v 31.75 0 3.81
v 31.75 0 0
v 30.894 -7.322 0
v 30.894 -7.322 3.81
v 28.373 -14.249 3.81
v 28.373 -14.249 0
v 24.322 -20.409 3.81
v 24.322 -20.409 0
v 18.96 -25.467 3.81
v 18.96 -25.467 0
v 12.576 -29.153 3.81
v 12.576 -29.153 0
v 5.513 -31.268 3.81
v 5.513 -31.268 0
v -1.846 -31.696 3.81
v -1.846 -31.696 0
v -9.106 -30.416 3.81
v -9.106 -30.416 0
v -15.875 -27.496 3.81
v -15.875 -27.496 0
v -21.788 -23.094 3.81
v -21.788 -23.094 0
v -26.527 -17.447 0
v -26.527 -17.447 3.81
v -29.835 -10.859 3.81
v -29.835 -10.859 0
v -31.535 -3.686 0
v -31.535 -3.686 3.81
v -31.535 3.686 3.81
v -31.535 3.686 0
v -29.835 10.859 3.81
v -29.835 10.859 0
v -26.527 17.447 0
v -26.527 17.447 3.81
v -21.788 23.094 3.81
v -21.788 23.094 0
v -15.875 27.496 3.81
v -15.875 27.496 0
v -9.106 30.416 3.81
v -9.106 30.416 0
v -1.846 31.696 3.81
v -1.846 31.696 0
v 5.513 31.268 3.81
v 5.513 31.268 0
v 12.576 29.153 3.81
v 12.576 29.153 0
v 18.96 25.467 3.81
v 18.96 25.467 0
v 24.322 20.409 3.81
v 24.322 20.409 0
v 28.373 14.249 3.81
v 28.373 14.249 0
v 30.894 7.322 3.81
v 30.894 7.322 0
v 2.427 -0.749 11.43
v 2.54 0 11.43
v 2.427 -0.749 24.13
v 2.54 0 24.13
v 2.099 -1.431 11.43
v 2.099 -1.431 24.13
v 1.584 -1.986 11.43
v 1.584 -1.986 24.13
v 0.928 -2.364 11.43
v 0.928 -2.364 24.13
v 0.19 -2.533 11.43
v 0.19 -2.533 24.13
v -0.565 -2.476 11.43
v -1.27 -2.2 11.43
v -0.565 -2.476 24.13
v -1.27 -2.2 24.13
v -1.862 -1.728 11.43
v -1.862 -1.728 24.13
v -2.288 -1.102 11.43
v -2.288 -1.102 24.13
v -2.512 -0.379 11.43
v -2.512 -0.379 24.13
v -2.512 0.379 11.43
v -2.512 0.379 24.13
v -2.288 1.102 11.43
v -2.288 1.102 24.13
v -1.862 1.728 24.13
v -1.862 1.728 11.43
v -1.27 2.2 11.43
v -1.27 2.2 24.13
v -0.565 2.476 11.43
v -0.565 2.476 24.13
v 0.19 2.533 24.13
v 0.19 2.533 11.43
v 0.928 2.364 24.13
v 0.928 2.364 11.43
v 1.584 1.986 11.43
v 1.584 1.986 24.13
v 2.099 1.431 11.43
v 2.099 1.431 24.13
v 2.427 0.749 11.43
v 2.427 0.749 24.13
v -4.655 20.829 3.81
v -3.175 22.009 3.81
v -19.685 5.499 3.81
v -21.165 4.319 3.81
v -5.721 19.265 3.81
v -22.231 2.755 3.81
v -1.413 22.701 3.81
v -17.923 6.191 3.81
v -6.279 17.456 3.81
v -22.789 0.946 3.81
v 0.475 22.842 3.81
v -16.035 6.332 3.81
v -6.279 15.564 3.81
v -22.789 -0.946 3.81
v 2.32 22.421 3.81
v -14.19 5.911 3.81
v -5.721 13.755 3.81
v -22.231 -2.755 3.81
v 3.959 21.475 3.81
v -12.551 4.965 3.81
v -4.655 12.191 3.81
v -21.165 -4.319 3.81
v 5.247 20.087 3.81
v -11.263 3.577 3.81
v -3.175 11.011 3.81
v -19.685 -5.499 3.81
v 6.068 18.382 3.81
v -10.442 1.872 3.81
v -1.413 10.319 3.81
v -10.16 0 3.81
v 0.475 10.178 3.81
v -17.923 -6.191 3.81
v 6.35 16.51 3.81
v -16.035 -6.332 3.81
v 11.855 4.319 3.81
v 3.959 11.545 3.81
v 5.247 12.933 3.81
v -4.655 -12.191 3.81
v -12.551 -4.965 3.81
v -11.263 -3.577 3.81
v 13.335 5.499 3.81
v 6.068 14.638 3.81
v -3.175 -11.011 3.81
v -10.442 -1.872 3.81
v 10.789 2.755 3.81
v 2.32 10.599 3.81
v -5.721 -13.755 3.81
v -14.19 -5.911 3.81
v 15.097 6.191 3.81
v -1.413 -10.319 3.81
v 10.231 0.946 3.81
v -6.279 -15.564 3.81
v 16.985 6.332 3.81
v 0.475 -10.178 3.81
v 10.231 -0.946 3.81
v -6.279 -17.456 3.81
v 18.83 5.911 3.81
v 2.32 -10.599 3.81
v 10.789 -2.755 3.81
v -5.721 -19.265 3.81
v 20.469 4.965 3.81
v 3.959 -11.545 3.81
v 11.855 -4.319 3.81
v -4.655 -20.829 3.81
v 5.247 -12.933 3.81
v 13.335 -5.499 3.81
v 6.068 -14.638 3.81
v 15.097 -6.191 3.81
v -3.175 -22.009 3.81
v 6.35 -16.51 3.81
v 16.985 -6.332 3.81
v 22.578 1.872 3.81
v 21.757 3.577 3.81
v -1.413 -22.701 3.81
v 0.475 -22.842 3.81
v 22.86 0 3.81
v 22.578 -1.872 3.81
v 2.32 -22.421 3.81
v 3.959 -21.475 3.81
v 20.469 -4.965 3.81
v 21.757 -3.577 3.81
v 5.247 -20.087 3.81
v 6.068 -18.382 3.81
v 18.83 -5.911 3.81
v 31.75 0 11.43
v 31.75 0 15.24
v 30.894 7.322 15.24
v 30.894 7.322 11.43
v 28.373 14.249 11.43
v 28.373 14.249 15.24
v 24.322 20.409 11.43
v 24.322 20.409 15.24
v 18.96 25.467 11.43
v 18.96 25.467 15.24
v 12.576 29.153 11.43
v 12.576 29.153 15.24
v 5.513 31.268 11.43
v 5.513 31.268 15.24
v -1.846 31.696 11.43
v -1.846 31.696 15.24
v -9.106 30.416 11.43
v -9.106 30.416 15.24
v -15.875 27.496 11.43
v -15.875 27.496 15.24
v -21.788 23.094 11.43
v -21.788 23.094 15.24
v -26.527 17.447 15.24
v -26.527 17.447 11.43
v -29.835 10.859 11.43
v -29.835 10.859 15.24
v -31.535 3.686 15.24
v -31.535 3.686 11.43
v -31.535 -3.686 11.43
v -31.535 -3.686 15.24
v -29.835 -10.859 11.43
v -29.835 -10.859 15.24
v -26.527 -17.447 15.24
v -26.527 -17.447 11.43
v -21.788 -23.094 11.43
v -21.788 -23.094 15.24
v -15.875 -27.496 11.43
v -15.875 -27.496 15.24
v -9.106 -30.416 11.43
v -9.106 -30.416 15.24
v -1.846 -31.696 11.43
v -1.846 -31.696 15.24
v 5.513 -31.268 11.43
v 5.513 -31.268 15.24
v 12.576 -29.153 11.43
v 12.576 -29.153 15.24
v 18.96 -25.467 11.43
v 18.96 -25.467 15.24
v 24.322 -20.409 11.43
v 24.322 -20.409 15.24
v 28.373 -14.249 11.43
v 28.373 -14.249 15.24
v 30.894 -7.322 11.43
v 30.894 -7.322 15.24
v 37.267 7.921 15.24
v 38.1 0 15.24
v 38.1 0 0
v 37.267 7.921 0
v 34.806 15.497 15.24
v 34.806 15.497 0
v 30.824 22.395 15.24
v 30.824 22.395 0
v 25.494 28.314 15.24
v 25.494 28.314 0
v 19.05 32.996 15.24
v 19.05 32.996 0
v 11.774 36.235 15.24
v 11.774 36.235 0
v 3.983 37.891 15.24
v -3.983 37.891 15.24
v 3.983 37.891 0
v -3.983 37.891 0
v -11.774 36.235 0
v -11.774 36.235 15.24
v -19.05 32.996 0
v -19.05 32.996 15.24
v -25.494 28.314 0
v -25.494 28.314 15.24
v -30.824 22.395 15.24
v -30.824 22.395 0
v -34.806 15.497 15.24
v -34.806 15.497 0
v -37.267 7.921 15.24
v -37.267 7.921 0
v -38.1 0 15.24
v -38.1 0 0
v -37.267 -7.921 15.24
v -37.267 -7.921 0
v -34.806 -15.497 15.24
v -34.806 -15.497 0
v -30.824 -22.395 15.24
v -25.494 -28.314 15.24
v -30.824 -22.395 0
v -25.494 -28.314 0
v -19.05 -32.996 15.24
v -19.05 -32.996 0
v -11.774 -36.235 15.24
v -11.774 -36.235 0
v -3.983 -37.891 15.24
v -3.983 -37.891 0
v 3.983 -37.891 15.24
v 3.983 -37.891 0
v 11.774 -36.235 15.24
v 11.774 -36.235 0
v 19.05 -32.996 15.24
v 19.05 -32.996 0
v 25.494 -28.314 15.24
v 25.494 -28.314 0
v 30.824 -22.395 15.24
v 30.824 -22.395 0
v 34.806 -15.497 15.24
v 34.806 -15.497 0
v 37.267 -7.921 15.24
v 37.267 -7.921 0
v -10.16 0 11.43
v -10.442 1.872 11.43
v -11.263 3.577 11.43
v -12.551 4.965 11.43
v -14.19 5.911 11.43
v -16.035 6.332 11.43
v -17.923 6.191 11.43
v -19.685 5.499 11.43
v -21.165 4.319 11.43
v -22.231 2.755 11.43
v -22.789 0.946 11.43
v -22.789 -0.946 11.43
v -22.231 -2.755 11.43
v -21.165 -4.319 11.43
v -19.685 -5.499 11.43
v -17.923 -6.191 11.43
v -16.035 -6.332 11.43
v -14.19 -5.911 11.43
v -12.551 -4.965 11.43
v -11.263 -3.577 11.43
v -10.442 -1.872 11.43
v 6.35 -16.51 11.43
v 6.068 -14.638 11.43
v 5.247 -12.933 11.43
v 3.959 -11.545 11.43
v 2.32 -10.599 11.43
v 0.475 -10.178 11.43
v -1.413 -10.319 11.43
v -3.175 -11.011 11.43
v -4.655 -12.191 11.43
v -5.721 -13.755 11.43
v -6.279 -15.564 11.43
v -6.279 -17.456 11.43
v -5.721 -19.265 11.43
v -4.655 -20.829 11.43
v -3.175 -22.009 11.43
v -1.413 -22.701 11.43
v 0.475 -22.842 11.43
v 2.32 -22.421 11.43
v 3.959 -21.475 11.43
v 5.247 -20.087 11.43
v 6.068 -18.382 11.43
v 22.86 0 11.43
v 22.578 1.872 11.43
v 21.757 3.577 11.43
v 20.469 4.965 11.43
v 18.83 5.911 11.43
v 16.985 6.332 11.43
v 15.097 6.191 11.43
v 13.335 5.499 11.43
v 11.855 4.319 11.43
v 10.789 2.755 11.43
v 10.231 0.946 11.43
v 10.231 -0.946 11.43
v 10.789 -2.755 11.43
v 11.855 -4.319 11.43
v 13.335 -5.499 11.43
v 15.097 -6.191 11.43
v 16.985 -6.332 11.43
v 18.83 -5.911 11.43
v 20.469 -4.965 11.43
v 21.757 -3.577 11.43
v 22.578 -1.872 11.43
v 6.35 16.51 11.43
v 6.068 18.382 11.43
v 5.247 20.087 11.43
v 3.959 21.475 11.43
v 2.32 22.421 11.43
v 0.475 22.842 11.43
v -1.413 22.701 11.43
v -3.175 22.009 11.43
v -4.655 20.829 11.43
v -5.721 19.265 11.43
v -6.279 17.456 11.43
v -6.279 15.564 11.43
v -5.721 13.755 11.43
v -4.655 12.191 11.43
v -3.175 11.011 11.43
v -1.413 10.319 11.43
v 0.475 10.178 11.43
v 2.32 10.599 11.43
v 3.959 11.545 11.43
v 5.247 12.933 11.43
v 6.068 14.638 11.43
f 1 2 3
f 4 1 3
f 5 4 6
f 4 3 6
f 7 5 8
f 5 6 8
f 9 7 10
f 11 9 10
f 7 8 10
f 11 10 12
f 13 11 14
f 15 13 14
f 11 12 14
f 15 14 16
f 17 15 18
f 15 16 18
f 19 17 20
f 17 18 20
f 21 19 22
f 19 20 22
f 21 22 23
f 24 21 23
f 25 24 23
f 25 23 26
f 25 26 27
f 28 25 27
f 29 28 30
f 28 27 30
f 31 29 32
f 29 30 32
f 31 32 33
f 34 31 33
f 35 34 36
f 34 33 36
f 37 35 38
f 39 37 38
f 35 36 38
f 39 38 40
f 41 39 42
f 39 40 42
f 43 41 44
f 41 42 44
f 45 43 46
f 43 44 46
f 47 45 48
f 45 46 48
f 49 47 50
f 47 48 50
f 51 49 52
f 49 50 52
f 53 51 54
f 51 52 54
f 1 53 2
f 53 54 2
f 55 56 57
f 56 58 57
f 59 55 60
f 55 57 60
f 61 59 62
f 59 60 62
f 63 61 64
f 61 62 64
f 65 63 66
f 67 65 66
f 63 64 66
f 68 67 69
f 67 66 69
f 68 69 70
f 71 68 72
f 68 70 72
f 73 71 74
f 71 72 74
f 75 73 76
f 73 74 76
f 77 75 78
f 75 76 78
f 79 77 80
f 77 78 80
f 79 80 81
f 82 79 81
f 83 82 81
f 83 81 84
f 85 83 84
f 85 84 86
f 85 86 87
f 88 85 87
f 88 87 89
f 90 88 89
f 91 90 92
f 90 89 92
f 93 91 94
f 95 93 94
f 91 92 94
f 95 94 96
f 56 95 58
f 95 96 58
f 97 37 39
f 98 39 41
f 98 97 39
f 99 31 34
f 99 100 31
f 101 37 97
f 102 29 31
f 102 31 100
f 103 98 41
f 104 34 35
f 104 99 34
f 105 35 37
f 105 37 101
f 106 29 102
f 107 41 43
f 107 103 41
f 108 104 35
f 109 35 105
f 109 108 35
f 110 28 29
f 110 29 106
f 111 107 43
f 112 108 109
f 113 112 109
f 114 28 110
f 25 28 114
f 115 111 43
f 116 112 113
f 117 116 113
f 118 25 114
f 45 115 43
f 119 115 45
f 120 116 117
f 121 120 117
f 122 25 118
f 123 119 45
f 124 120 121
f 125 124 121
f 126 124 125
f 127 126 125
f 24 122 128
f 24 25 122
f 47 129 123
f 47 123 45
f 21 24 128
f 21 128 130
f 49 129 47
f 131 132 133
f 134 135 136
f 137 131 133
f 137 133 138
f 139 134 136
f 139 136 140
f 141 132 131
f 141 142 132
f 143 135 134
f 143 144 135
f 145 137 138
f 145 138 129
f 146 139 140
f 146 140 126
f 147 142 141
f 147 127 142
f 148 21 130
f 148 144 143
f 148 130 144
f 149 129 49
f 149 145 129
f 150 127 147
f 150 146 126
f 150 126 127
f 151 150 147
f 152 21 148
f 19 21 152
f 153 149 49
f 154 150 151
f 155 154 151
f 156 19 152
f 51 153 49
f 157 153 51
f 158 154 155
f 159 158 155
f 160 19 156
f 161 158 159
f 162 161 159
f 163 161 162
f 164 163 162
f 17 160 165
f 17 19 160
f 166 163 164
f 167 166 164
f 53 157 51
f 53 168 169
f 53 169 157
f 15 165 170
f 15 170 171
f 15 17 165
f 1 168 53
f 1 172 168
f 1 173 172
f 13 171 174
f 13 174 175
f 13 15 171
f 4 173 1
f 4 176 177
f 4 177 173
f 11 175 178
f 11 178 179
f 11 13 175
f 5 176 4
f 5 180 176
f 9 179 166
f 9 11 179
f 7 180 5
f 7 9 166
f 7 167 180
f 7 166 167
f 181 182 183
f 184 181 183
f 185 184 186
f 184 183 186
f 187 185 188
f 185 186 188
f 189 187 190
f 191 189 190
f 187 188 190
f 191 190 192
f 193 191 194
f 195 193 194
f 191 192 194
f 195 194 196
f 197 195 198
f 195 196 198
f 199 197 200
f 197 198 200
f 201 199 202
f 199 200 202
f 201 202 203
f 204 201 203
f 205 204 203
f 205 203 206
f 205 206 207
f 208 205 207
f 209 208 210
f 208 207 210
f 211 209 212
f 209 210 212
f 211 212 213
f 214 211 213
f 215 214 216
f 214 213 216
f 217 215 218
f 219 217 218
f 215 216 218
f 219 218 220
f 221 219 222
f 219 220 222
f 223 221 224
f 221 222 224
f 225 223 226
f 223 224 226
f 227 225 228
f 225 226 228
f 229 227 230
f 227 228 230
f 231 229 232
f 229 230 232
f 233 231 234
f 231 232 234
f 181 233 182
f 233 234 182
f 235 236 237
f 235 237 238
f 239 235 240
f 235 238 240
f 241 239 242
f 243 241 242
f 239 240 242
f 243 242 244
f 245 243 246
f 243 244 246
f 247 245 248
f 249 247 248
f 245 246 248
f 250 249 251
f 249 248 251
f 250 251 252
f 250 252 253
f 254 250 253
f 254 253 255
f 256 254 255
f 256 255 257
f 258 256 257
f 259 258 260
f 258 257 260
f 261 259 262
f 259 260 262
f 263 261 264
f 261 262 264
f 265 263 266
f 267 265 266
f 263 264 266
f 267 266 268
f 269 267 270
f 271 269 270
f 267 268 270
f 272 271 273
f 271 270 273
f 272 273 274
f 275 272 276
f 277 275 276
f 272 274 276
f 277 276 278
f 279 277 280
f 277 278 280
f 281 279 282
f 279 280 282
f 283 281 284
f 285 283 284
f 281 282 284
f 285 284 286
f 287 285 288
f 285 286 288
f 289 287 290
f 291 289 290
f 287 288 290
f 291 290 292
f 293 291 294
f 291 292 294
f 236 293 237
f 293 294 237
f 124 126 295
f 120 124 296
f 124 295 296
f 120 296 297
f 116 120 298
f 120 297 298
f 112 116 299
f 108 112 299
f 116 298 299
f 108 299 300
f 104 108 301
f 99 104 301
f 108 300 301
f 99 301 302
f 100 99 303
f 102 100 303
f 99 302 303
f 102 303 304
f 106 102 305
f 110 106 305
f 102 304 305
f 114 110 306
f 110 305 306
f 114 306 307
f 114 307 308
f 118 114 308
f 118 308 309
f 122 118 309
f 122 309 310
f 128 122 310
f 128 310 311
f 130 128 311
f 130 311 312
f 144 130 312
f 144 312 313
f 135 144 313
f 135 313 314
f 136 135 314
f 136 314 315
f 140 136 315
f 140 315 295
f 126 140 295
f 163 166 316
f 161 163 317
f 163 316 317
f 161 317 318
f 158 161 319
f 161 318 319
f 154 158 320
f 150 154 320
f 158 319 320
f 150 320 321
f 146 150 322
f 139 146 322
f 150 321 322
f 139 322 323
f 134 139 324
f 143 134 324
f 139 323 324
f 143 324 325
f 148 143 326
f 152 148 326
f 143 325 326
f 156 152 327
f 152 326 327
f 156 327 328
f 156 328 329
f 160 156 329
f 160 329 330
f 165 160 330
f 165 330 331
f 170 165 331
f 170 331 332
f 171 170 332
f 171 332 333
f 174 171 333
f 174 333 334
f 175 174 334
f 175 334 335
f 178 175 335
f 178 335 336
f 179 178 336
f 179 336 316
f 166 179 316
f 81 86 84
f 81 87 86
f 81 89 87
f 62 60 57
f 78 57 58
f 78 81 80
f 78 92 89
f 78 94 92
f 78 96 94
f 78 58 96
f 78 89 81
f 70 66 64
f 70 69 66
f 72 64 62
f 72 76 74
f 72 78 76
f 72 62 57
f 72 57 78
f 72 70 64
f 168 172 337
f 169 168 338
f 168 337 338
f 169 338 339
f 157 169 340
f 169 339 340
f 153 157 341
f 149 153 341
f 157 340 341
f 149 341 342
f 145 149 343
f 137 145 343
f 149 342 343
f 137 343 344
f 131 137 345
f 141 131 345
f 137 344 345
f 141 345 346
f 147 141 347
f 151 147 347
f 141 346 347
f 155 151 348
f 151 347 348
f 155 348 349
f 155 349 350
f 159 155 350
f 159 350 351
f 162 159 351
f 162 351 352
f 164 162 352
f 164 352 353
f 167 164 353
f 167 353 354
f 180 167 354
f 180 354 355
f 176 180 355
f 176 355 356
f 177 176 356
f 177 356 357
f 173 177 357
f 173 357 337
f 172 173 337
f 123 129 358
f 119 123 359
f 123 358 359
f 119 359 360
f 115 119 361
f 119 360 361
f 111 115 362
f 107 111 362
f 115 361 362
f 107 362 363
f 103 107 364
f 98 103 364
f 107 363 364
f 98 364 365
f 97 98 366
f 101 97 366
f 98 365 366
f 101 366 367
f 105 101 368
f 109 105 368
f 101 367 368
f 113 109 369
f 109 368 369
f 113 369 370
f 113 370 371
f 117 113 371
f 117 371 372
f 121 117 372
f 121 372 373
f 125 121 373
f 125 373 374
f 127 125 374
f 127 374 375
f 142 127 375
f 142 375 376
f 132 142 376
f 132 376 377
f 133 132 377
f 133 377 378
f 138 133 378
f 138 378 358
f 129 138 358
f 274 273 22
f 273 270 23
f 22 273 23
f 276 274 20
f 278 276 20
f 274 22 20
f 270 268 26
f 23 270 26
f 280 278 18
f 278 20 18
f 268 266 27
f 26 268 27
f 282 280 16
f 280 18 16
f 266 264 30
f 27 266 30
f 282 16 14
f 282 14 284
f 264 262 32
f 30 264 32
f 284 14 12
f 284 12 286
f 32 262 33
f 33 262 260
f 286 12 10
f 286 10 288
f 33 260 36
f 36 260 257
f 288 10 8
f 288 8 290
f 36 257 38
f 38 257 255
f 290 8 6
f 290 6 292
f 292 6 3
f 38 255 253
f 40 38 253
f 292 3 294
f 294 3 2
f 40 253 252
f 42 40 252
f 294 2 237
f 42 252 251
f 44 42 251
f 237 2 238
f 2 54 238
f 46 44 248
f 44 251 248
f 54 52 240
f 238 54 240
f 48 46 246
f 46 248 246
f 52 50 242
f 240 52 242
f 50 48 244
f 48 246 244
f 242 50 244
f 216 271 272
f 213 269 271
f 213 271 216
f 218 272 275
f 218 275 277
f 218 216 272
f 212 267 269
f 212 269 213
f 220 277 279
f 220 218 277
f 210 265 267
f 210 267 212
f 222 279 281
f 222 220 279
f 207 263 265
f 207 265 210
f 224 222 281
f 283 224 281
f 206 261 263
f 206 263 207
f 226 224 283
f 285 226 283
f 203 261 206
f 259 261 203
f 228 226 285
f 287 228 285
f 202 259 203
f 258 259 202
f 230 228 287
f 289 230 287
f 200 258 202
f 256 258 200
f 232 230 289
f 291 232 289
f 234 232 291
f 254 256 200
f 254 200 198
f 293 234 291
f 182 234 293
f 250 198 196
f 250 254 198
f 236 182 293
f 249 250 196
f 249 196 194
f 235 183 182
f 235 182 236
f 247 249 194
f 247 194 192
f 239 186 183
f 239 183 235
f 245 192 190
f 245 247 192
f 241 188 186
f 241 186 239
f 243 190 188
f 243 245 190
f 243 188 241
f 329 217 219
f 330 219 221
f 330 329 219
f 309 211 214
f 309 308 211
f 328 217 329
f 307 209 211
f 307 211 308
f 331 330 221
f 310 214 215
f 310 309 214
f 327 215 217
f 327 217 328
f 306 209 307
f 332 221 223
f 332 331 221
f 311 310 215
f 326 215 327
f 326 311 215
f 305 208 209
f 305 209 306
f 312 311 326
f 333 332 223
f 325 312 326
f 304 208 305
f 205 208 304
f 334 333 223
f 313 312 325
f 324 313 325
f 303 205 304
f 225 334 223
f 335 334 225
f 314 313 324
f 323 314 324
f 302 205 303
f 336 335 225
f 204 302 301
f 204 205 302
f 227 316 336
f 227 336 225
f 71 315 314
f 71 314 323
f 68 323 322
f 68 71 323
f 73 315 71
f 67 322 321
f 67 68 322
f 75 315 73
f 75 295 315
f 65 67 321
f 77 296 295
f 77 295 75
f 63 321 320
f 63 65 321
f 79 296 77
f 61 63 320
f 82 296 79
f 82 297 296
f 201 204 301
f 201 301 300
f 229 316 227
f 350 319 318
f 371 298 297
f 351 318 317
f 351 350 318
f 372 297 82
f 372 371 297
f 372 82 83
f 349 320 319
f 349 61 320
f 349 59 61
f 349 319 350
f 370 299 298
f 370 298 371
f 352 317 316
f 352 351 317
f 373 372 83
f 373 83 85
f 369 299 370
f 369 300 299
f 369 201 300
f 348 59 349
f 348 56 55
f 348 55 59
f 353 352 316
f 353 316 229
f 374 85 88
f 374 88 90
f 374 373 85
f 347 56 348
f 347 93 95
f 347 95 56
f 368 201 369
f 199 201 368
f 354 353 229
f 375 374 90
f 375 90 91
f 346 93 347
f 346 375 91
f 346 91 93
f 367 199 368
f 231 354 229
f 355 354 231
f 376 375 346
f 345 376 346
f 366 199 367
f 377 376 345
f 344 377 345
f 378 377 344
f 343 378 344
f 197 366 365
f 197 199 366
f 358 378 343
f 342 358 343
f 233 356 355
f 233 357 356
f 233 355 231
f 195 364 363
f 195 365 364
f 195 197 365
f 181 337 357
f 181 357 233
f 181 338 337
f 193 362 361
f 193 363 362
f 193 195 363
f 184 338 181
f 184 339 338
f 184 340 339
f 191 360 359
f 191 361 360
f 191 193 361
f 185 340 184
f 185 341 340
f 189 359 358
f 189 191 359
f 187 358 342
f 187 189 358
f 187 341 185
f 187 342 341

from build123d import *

# Parameters (mm, degrees)
F0_R     = 38.1
F1_DEPTH = 15.24
F2_R     = 31.75
F3_DEPTH = 3.81
F4_R     = 31.75
F5_DEPTH = 3.81
F6_R     = 6.35
F7_DEPTH = 11.431
F8_W     = 2.54
F8_H     = 12.7


# Not quite as in the source:
# - a feature names something its author has since deleted; it is built from what else it names


with BuildPart() as f1:
    # F0 (on Top) → F1 (new body)
    with BuildSketch(Plane.XY):
        Circle(F0_R)
    extrude(amount=F1_DEPTH)

    # F2 (on face) → F3 (cut)
    with BuildSketch(Plane.XY.offset(15.24)):
        Circle(F2_R)
    extrude(amount=-F3_DEPTH, mode=Mode.SUBTRACT)

    # F4 (on face) → F5 (cut)
    with BuildSketch(Plane(origin=(0, 0, 0), x_dir=(1, 0, 0), z_dir=(0, 0, -1))):
        Circle(F4_R)
    extrude(amount=-F5_DEPTH, mode=Mode.SUBTRACT)

    # F6 (on face) → F7 (cut, through all)
    with BuildSketch(Plane.XY.offset(11.43)):
        with Locations((0, 16.51)):
            Circle(F6_R)
        with Locations((16.51, 0)):
            Circle(F6_R)
        with Locations((0, -16.51)):
            Circle(F6_R)
        with Locations((-16.51, 0)):
            Circle(F6_R)
    extrude(amount=-F7_DEPTH, mode=Mode.SUBTRACT)

    # F8 (on Front) → F10 (revolve)
    with BuildSketch(Plane.XZ):
        with Locations((1.27, 17.78)):
            Rectangle(F8_W, F8_H)
    revolve(axis=Axis((0, 0, 19.05), (0, 0, -1)))


solid = f1.part
